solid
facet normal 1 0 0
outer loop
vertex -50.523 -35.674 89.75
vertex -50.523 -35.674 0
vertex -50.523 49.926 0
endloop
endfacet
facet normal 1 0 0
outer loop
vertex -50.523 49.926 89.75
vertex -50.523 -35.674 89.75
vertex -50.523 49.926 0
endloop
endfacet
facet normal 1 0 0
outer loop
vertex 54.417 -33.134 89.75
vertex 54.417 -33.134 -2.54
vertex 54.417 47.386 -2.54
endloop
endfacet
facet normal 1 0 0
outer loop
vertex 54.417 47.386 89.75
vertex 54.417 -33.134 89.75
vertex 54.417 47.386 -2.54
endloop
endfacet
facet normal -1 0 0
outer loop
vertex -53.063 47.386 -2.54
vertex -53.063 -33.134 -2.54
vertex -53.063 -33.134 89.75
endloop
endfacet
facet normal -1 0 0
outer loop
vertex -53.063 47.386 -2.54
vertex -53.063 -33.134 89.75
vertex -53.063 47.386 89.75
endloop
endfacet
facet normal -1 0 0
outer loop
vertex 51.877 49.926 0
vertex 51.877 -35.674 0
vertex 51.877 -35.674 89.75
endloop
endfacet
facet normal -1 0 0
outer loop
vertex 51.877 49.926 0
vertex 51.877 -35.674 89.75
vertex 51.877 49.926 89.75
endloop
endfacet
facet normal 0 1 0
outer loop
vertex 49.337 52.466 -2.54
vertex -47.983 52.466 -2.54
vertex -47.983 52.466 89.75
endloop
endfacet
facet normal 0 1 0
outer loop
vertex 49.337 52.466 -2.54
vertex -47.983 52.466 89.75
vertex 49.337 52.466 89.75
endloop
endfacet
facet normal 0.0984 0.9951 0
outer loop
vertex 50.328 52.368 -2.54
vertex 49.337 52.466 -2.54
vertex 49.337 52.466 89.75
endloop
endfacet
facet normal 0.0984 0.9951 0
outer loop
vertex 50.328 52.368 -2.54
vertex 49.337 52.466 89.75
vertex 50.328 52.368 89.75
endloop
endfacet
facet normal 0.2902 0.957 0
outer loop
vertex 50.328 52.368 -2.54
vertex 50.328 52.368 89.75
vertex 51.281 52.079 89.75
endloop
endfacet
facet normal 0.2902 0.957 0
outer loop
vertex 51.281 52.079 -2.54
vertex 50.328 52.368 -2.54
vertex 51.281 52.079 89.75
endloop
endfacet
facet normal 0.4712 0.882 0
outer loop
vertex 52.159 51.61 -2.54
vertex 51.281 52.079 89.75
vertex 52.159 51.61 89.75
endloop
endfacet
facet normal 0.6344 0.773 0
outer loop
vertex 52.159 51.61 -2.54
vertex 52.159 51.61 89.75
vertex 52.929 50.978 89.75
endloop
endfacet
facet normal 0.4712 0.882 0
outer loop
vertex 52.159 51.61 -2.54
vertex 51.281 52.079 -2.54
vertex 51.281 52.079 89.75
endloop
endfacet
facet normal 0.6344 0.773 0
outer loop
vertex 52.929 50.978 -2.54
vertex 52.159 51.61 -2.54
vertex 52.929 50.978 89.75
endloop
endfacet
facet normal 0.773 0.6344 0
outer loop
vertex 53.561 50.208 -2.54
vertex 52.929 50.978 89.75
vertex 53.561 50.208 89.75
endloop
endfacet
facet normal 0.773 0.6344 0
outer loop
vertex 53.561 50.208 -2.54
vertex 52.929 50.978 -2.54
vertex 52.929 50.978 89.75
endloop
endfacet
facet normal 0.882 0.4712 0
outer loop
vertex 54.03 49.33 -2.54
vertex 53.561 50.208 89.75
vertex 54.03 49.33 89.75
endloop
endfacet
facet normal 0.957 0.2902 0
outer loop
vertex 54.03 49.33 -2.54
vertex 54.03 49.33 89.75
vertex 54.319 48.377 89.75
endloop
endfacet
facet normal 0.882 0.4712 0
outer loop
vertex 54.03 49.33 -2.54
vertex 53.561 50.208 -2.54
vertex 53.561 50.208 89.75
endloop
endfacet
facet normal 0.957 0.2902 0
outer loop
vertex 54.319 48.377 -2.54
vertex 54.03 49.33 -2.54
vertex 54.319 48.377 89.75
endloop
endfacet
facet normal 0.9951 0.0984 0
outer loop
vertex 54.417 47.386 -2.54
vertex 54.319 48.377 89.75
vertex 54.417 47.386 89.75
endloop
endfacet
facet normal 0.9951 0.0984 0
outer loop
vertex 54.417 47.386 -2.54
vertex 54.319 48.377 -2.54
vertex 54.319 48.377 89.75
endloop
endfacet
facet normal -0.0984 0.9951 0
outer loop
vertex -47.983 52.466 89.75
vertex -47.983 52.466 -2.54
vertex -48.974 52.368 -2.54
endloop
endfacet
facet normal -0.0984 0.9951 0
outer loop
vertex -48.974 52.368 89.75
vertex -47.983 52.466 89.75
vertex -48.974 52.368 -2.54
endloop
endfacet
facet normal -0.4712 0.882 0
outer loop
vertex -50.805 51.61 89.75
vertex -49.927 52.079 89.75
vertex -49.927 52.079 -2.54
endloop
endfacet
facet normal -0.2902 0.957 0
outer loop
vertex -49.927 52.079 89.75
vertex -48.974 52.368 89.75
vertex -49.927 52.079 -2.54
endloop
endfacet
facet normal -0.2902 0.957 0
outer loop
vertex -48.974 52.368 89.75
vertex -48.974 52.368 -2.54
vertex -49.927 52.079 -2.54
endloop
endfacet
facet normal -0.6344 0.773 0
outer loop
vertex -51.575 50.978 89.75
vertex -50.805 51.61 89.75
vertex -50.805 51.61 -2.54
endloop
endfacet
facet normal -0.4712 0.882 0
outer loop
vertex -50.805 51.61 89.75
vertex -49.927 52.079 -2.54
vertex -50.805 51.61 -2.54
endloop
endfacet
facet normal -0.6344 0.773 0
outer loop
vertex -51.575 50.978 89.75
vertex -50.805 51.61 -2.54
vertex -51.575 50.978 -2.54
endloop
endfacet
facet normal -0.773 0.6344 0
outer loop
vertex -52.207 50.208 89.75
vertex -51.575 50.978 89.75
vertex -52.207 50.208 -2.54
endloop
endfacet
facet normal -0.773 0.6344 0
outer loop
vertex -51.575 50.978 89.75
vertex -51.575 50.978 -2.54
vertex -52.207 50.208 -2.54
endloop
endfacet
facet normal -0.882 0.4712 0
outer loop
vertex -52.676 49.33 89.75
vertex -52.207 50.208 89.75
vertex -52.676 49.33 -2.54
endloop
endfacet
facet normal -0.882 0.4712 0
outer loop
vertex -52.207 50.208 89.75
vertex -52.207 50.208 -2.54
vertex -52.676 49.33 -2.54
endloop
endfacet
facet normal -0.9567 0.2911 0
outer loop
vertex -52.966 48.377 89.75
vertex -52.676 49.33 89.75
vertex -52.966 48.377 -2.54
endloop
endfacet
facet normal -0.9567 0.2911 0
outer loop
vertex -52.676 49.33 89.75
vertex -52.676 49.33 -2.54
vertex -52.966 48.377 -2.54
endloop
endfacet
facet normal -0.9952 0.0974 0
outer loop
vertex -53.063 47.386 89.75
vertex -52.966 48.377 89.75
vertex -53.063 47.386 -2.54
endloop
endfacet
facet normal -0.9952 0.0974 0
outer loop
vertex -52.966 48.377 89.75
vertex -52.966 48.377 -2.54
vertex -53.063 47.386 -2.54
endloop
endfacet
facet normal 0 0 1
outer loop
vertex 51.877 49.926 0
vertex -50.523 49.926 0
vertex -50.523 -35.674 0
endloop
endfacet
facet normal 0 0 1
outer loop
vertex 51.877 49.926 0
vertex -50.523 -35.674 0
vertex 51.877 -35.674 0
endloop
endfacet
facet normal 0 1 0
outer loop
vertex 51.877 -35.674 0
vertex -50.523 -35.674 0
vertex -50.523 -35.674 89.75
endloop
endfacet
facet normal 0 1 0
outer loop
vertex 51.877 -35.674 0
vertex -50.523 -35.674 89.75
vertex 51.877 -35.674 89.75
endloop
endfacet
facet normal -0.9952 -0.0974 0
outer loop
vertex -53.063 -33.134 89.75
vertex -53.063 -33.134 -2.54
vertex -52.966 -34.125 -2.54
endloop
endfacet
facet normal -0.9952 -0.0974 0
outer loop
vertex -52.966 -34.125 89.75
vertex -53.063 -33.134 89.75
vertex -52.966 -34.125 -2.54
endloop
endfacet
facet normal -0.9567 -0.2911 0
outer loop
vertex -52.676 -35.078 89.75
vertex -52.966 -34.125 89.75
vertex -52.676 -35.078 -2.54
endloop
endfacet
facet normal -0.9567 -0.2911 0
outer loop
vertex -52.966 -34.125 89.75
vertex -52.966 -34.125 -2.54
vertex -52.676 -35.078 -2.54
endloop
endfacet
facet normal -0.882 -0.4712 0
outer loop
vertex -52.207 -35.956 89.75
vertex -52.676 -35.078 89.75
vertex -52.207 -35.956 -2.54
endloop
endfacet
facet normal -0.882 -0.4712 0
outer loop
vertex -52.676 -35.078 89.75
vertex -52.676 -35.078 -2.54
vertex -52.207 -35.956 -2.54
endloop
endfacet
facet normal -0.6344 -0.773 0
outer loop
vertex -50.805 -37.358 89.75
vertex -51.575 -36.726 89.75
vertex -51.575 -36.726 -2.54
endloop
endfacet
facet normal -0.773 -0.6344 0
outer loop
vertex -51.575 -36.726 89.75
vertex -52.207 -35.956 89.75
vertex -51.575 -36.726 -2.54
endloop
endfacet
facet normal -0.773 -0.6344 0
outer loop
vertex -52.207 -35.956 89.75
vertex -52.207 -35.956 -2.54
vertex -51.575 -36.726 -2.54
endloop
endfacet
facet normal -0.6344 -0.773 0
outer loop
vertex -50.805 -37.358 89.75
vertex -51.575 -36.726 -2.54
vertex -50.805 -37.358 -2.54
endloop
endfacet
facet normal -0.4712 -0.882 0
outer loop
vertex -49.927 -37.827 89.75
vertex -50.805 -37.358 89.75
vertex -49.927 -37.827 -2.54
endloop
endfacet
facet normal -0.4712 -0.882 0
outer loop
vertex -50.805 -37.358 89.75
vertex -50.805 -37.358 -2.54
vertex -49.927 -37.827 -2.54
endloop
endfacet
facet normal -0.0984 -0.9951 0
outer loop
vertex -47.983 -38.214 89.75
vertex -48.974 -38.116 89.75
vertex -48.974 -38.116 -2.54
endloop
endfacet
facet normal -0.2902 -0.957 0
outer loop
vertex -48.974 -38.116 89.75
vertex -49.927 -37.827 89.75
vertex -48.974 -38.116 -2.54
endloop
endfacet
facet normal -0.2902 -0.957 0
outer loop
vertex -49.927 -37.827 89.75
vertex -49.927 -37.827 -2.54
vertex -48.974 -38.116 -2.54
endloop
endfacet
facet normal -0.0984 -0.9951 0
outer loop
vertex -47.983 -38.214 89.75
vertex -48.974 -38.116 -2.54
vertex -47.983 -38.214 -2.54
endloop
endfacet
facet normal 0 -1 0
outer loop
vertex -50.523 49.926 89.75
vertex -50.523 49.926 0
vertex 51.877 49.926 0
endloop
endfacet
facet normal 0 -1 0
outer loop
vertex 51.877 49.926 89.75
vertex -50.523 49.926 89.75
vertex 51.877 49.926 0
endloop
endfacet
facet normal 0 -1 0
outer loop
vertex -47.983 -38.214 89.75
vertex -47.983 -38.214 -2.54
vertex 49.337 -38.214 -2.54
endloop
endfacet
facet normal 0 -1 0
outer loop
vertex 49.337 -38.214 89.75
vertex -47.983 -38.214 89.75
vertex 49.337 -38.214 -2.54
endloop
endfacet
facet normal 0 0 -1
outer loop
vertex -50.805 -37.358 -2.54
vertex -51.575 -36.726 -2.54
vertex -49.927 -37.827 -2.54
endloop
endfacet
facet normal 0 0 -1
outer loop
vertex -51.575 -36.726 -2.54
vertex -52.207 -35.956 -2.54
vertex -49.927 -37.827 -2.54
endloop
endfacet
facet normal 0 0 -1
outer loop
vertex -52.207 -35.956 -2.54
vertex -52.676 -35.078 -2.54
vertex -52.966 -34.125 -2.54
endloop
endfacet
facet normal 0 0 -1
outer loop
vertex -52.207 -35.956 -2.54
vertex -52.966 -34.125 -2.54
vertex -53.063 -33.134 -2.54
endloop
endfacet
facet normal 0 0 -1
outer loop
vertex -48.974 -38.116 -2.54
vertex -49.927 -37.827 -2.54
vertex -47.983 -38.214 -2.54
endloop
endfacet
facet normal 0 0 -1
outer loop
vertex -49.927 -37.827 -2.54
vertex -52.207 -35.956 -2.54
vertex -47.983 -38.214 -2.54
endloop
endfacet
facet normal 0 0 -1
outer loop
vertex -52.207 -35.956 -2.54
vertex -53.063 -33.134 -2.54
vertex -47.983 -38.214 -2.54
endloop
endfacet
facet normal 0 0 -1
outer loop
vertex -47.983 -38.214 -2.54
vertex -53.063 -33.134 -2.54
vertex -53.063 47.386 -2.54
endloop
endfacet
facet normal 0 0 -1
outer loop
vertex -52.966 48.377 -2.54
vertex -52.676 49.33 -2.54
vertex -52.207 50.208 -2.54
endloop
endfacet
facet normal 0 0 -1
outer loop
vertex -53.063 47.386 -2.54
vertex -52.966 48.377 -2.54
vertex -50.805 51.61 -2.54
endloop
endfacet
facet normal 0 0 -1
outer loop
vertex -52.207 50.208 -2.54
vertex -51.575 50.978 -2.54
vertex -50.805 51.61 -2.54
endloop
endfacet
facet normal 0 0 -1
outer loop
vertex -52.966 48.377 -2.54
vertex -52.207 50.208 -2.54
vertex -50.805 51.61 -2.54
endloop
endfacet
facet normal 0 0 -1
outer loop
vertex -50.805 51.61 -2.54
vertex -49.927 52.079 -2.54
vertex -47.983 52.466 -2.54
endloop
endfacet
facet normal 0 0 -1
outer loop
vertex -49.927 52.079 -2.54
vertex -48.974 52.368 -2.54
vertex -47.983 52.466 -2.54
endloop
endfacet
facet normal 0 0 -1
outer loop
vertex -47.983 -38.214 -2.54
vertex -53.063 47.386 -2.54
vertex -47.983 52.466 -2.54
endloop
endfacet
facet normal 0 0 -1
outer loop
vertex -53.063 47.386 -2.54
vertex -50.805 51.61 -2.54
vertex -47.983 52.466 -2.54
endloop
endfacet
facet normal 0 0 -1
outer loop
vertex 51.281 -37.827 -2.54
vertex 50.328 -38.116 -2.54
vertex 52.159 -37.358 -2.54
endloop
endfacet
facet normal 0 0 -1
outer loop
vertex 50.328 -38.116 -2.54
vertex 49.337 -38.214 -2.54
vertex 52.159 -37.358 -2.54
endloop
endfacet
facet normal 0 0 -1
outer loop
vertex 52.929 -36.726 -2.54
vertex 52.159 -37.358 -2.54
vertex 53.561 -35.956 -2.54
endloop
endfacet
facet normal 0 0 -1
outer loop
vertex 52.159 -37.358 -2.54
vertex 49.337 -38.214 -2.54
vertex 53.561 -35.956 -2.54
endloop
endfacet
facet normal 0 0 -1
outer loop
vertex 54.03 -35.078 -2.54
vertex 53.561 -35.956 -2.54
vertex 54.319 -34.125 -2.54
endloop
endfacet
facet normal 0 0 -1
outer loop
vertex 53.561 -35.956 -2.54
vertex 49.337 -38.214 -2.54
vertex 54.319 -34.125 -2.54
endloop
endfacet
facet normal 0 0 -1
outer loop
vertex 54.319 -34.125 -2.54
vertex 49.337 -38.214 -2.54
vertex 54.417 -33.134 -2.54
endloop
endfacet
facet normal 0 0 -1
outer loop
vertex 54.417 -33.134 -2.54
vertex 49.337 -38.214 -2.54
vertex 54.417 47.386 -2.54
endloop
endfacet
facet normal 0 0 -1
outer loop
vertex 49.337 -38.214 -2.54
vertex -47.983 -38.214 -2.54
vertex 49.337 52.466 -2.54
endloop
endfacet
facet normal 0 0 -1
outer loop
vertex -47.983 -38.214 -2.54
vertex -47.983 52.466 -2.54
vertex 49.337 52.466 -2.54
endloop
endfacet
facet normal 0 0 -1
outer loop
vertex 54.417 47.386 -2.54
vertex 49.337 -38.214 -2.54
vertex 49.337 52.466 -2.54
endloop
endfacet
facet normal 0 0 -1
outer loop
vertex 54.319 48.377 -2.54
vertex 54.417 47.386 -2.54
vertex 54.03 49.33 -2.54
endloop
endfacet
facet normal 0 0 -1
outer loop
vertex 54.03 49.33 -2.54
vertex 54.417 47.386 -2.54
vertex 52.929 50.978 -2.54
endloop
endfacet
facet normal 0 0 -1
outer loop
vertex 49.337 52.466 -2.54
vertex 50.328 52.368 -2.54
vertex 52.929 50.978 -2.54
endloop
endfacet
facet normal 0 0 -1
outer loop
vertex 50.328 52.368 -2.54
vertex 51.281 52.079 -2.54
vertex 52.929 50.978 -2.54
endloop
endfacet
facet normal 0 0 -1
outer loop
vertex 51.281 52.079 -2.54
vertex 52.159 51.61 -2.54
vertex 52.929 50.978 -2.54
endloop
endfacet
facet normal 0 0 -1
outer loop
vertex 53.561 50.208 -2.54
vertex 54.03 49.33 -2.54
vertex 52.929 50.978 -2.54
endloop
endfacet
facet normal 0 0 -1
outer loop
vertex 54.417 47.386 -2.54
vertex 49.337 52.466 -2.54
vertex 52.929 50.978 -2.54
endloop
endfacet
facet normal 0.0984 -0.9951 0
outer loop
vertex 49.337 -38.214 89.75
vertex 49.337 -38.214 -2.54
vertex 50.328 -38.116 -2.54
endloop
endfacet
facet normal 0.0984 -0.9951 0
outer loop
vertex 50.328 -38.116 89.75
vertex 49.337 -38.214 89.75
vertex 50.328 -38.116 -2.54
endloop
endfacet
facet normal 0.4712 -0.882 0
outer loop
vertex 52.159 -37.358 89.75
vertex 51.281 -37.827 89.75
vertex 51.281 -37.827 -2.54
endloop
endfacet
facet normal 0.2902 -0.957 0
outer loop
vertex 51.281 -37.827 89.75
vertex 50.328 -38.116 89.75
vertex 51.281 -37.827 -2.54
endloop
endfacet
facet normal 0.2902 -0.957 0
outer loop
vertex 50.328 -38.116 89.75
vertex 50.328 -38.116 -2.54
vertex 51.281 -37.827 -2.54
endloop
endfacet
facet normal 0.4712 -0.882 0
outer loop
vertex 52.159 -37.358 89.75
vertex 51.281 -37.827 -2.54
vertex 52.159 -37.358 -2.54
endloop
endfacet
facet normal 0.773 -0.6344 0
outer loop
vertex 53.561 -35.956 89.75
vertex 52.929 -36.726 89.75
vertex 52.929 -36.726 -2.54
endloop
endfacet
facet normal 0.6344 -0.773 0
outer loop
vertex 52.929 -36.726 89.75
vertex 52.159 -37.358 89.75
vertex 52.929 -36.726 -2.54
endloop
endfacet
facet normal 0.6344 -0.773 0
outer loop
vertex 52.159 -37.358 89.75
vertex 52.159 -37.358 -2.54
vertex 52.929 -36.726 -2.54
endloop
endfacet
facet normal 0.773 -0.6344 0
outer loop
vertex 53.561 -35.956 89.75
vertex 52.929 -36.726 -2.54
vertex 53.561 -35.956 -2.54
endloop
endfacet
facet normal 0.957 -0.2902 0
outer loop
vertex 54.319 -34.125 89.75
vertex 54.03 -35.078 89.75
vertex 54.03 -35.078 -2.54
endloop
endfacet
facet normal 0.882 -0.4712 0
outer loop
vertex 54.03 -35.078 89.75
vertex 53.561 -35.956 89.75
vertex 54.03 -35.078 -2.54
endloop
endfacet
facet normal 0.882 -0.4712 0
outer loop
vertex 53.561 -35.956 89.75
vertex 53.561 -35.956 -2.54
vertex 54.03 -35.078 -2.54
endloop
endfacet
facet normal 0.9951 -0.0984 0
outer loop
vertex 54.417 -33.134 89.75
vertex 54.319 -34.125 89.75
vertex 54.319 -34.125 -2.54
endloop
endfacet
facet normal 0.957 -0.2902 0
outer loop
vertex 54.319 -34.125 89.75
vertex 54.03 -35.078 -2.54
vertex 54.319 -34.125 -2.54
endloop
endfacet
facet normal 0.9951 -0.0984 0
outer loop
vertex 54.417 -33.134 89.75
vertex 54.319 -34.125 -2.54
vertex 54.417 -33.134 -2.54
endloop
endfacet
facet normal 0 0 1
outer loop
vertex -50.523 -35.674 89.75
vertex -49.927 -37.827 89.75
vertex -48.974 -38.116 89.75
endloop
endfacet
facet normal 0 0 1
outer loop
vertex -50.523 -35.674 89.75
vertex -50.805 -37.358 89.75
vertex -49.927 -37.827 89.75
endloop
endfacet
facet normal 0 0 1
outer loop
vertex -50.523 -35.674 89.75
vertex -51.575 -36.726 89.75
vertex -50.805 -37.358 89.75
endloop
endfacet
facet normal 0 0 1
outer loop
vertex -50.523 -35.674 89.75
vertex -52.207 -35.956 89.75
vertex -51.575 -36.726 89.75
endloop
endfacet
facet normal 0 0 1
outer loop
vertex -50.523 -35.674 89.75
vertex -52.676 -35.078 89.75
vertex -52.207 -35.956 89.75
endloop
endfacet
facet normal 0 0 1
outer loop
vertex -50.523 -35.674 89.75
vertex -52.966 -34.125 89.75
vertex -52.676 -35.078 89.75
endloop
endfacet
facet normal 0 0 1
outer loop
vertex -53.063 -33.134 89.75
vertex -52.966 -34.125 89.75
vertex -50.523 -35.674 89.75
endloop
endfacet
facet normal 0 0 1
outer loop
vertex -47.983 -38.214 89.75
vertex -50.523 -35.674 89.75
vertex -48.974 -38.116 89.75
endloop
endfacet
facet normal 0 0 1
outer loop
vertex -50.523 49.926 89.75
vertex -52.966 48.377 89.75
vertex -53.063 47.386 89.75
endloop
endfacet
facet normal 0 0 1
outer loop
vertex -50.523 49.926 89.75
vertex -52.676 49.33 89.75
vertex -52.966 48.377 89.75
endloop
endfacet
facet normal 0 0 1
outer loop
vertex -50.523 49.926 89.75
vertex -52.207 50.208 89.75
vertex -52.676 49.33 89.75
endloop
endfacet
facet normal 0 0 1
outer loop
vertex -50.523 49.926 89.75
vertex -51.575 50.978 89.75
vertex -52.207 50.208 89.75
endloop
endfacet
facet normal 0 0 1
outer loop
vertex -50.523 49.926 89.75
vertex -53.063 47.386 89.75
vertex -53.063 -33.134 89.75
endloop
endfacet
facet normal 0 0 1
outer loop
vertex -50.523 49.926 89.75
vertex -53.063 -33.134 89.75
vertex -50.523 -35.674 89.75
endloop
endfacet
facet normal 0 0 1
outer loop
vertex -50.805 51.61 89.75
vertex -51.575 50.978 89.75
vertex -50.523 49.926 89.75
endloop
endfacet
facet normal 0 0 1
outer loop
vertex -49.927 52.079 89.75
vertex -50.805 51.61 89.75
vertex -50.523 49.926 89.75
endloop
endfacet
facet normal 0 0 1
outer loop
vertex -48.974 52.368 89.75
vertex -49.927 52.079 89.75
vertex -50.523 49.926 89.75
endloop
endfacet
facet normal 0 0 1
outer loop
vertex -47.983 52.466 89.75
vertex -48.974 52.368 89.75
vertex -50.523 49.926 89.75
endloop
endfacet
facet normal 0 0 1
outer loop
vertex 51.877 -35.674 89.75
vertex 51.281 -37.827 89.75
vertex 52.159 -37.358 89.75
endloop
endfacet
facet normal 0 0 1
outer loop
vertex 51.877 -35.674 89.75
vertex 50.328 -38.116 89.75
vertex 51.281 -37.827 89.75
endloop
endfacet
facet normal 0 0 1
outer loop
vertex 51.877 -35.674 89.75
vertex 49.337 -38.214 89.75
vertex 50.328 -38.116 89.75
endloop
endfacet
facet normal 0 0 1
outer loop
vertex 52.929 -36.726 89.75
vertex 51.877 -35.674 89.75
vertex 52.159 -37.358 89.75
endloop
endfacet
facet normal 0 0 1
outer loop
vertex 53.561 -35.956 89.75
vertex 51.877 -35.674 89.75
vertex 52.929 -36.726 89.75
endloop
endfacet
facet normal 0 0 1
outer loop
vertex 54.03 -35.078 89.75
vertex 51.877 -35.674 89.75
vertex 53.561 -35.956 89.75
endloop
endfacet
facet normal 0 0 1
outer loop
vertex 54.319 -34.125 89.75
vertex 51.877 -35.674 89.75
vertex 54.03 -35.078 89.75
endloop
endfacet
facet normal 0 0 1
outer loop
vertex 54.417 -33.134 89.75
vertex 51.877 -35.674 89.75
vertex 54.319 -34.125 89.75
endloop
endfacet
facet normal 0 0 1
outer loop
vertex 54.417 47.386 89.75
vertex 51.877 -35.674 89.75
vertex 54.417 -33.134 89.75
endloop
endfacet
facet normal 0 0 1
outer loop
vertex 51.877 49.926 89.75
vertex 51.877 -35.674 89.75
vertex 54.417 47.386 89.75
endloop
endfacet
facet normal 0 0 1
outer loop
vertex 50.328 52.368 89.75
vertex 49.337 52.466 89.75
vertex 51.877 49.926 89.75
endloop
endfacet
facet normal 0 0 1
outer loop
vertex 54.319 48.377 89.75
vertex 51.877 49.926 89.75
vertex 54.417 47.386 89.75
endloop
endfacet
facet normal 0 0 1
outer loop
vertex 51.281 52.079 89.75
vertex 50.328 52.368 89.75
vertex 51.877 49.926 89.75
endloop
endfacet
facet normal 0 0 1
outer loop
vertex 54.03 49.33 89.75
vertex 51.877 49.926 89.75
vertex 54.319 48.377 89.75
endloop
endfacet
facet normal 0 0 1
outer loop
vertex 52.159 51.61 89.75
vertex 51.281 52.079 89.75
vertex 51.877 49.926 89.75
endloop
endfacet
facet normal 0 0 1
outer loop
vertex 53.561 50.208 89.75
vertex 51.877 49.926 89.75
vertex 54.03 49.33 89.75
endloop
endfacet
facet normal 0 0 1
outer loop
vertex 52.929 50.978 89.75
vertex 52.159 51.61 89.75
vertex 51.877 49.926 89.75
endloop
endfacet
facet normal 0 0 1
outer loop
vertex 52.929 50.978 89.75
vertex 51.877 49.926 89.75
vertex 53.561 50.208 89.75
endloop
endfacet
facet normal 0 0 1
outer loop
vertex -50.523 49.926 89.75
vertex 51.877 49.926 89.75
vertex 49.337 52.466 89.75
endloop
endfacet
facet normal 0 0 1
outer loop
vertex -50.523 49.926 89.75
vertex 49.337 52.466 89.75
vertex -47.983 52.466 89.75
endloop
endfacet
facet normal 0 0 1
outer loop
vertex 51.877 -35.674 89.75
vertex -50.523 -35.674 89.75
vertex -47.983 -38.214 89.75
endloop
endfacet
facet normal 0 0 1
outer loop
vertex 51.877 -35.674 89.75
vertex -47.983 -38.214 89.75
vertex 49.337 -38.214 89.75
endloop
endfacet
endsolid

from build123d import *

# Parameters (mm, degrees)
F0_W        = 102.4
F0_H        = 85.6
F1_DEPTH    = 89.75
F2_T        = 2.54
F3_T1_DEPTH = 117.69


# Not quite as in the source:
# - a fillet or chamfer that OpenCascade refuses, or shapes differently, is made with other operations: its cross-section is extruded or revolved along the edge and cut away or added


with BuildPart() as f1:
    # F0 (on Top) → F1 (new body)
    with BuildSketch(Plane.XY):
        with Locations((0.6768562123, 7.1260996301)):
            Rectangle(F0_W, F0_H)
    extrude(amount=F1_DEPTH)

    # F2
    f2_openings = [f1.faces().sort_by_distance(p)[0] for p in [
        (0.676856, 7.1261, 89.75),
    ]]
    offset(amount=F2_T, openings=f2_openings, kind=Kind.INTERSECTION)

    # F3: fillet of radius 5.08 on 4 edges, made by hand

    # F3_s2 → F3_t1 (cut)
    with BuildSketch(Plane.XY.offset(-15.24)):
        with BuildLine():
            ThreePointArc((49.3368562123, 52.4660996301), (52.9289586607, 50.9782020785), (54.4168562123, 47.3860996301))
            Line((54.4168562123, 47.3860996301), (54.4168562123, 52.4660996301))
            Line((54.4168562123, 52.4660996301), (49.3368562123, 52.4660996301))
        make_face()
        with BuildLine():
            ThreePointArc((-47.9831437877, 52.4660996301), (-51.5752462361, 50.9782020785), (-53.0631437877, 47.3860996301))
            Line((-53.0631437877, 47.3860996301), (-53.0631437877, 52.4660996301))
            Line((-53.0631437877, 52.4660996301), (-47.9831437877, 52.4660996301))
        make_face()
        with BuildLine():
            ThreePointArc((-53.0631437877, -33.1339003699), (-51.5752462361, -36.7260028183), (-47.9831437877, -38.2139003699))
            Line((-47.9831437877, -38.2139003699), (-53.0631437877, -38.2139003699))
            Line((-53.0631437877, -38.2139003699), (-53.0631437877, -33.1339003699))
        make_face()
        with BuildLine():
            ThreePointArc((49.3368562123, -38.2139003699), (52.9289586607, -36.7260028183), (54.4168562123, -33.1339003699))
            Line((54.4168562123, -33.1339003699), (54.4168562123, -38.2139003699))
            Line((54.4168562123, -38.2139003699), (49.3368562123, -38.2139003699))
        make_face()
    extrude(amount=F3_T1_DEPTH, mode=Mode.SUBTRACT)


solid = f1.part
